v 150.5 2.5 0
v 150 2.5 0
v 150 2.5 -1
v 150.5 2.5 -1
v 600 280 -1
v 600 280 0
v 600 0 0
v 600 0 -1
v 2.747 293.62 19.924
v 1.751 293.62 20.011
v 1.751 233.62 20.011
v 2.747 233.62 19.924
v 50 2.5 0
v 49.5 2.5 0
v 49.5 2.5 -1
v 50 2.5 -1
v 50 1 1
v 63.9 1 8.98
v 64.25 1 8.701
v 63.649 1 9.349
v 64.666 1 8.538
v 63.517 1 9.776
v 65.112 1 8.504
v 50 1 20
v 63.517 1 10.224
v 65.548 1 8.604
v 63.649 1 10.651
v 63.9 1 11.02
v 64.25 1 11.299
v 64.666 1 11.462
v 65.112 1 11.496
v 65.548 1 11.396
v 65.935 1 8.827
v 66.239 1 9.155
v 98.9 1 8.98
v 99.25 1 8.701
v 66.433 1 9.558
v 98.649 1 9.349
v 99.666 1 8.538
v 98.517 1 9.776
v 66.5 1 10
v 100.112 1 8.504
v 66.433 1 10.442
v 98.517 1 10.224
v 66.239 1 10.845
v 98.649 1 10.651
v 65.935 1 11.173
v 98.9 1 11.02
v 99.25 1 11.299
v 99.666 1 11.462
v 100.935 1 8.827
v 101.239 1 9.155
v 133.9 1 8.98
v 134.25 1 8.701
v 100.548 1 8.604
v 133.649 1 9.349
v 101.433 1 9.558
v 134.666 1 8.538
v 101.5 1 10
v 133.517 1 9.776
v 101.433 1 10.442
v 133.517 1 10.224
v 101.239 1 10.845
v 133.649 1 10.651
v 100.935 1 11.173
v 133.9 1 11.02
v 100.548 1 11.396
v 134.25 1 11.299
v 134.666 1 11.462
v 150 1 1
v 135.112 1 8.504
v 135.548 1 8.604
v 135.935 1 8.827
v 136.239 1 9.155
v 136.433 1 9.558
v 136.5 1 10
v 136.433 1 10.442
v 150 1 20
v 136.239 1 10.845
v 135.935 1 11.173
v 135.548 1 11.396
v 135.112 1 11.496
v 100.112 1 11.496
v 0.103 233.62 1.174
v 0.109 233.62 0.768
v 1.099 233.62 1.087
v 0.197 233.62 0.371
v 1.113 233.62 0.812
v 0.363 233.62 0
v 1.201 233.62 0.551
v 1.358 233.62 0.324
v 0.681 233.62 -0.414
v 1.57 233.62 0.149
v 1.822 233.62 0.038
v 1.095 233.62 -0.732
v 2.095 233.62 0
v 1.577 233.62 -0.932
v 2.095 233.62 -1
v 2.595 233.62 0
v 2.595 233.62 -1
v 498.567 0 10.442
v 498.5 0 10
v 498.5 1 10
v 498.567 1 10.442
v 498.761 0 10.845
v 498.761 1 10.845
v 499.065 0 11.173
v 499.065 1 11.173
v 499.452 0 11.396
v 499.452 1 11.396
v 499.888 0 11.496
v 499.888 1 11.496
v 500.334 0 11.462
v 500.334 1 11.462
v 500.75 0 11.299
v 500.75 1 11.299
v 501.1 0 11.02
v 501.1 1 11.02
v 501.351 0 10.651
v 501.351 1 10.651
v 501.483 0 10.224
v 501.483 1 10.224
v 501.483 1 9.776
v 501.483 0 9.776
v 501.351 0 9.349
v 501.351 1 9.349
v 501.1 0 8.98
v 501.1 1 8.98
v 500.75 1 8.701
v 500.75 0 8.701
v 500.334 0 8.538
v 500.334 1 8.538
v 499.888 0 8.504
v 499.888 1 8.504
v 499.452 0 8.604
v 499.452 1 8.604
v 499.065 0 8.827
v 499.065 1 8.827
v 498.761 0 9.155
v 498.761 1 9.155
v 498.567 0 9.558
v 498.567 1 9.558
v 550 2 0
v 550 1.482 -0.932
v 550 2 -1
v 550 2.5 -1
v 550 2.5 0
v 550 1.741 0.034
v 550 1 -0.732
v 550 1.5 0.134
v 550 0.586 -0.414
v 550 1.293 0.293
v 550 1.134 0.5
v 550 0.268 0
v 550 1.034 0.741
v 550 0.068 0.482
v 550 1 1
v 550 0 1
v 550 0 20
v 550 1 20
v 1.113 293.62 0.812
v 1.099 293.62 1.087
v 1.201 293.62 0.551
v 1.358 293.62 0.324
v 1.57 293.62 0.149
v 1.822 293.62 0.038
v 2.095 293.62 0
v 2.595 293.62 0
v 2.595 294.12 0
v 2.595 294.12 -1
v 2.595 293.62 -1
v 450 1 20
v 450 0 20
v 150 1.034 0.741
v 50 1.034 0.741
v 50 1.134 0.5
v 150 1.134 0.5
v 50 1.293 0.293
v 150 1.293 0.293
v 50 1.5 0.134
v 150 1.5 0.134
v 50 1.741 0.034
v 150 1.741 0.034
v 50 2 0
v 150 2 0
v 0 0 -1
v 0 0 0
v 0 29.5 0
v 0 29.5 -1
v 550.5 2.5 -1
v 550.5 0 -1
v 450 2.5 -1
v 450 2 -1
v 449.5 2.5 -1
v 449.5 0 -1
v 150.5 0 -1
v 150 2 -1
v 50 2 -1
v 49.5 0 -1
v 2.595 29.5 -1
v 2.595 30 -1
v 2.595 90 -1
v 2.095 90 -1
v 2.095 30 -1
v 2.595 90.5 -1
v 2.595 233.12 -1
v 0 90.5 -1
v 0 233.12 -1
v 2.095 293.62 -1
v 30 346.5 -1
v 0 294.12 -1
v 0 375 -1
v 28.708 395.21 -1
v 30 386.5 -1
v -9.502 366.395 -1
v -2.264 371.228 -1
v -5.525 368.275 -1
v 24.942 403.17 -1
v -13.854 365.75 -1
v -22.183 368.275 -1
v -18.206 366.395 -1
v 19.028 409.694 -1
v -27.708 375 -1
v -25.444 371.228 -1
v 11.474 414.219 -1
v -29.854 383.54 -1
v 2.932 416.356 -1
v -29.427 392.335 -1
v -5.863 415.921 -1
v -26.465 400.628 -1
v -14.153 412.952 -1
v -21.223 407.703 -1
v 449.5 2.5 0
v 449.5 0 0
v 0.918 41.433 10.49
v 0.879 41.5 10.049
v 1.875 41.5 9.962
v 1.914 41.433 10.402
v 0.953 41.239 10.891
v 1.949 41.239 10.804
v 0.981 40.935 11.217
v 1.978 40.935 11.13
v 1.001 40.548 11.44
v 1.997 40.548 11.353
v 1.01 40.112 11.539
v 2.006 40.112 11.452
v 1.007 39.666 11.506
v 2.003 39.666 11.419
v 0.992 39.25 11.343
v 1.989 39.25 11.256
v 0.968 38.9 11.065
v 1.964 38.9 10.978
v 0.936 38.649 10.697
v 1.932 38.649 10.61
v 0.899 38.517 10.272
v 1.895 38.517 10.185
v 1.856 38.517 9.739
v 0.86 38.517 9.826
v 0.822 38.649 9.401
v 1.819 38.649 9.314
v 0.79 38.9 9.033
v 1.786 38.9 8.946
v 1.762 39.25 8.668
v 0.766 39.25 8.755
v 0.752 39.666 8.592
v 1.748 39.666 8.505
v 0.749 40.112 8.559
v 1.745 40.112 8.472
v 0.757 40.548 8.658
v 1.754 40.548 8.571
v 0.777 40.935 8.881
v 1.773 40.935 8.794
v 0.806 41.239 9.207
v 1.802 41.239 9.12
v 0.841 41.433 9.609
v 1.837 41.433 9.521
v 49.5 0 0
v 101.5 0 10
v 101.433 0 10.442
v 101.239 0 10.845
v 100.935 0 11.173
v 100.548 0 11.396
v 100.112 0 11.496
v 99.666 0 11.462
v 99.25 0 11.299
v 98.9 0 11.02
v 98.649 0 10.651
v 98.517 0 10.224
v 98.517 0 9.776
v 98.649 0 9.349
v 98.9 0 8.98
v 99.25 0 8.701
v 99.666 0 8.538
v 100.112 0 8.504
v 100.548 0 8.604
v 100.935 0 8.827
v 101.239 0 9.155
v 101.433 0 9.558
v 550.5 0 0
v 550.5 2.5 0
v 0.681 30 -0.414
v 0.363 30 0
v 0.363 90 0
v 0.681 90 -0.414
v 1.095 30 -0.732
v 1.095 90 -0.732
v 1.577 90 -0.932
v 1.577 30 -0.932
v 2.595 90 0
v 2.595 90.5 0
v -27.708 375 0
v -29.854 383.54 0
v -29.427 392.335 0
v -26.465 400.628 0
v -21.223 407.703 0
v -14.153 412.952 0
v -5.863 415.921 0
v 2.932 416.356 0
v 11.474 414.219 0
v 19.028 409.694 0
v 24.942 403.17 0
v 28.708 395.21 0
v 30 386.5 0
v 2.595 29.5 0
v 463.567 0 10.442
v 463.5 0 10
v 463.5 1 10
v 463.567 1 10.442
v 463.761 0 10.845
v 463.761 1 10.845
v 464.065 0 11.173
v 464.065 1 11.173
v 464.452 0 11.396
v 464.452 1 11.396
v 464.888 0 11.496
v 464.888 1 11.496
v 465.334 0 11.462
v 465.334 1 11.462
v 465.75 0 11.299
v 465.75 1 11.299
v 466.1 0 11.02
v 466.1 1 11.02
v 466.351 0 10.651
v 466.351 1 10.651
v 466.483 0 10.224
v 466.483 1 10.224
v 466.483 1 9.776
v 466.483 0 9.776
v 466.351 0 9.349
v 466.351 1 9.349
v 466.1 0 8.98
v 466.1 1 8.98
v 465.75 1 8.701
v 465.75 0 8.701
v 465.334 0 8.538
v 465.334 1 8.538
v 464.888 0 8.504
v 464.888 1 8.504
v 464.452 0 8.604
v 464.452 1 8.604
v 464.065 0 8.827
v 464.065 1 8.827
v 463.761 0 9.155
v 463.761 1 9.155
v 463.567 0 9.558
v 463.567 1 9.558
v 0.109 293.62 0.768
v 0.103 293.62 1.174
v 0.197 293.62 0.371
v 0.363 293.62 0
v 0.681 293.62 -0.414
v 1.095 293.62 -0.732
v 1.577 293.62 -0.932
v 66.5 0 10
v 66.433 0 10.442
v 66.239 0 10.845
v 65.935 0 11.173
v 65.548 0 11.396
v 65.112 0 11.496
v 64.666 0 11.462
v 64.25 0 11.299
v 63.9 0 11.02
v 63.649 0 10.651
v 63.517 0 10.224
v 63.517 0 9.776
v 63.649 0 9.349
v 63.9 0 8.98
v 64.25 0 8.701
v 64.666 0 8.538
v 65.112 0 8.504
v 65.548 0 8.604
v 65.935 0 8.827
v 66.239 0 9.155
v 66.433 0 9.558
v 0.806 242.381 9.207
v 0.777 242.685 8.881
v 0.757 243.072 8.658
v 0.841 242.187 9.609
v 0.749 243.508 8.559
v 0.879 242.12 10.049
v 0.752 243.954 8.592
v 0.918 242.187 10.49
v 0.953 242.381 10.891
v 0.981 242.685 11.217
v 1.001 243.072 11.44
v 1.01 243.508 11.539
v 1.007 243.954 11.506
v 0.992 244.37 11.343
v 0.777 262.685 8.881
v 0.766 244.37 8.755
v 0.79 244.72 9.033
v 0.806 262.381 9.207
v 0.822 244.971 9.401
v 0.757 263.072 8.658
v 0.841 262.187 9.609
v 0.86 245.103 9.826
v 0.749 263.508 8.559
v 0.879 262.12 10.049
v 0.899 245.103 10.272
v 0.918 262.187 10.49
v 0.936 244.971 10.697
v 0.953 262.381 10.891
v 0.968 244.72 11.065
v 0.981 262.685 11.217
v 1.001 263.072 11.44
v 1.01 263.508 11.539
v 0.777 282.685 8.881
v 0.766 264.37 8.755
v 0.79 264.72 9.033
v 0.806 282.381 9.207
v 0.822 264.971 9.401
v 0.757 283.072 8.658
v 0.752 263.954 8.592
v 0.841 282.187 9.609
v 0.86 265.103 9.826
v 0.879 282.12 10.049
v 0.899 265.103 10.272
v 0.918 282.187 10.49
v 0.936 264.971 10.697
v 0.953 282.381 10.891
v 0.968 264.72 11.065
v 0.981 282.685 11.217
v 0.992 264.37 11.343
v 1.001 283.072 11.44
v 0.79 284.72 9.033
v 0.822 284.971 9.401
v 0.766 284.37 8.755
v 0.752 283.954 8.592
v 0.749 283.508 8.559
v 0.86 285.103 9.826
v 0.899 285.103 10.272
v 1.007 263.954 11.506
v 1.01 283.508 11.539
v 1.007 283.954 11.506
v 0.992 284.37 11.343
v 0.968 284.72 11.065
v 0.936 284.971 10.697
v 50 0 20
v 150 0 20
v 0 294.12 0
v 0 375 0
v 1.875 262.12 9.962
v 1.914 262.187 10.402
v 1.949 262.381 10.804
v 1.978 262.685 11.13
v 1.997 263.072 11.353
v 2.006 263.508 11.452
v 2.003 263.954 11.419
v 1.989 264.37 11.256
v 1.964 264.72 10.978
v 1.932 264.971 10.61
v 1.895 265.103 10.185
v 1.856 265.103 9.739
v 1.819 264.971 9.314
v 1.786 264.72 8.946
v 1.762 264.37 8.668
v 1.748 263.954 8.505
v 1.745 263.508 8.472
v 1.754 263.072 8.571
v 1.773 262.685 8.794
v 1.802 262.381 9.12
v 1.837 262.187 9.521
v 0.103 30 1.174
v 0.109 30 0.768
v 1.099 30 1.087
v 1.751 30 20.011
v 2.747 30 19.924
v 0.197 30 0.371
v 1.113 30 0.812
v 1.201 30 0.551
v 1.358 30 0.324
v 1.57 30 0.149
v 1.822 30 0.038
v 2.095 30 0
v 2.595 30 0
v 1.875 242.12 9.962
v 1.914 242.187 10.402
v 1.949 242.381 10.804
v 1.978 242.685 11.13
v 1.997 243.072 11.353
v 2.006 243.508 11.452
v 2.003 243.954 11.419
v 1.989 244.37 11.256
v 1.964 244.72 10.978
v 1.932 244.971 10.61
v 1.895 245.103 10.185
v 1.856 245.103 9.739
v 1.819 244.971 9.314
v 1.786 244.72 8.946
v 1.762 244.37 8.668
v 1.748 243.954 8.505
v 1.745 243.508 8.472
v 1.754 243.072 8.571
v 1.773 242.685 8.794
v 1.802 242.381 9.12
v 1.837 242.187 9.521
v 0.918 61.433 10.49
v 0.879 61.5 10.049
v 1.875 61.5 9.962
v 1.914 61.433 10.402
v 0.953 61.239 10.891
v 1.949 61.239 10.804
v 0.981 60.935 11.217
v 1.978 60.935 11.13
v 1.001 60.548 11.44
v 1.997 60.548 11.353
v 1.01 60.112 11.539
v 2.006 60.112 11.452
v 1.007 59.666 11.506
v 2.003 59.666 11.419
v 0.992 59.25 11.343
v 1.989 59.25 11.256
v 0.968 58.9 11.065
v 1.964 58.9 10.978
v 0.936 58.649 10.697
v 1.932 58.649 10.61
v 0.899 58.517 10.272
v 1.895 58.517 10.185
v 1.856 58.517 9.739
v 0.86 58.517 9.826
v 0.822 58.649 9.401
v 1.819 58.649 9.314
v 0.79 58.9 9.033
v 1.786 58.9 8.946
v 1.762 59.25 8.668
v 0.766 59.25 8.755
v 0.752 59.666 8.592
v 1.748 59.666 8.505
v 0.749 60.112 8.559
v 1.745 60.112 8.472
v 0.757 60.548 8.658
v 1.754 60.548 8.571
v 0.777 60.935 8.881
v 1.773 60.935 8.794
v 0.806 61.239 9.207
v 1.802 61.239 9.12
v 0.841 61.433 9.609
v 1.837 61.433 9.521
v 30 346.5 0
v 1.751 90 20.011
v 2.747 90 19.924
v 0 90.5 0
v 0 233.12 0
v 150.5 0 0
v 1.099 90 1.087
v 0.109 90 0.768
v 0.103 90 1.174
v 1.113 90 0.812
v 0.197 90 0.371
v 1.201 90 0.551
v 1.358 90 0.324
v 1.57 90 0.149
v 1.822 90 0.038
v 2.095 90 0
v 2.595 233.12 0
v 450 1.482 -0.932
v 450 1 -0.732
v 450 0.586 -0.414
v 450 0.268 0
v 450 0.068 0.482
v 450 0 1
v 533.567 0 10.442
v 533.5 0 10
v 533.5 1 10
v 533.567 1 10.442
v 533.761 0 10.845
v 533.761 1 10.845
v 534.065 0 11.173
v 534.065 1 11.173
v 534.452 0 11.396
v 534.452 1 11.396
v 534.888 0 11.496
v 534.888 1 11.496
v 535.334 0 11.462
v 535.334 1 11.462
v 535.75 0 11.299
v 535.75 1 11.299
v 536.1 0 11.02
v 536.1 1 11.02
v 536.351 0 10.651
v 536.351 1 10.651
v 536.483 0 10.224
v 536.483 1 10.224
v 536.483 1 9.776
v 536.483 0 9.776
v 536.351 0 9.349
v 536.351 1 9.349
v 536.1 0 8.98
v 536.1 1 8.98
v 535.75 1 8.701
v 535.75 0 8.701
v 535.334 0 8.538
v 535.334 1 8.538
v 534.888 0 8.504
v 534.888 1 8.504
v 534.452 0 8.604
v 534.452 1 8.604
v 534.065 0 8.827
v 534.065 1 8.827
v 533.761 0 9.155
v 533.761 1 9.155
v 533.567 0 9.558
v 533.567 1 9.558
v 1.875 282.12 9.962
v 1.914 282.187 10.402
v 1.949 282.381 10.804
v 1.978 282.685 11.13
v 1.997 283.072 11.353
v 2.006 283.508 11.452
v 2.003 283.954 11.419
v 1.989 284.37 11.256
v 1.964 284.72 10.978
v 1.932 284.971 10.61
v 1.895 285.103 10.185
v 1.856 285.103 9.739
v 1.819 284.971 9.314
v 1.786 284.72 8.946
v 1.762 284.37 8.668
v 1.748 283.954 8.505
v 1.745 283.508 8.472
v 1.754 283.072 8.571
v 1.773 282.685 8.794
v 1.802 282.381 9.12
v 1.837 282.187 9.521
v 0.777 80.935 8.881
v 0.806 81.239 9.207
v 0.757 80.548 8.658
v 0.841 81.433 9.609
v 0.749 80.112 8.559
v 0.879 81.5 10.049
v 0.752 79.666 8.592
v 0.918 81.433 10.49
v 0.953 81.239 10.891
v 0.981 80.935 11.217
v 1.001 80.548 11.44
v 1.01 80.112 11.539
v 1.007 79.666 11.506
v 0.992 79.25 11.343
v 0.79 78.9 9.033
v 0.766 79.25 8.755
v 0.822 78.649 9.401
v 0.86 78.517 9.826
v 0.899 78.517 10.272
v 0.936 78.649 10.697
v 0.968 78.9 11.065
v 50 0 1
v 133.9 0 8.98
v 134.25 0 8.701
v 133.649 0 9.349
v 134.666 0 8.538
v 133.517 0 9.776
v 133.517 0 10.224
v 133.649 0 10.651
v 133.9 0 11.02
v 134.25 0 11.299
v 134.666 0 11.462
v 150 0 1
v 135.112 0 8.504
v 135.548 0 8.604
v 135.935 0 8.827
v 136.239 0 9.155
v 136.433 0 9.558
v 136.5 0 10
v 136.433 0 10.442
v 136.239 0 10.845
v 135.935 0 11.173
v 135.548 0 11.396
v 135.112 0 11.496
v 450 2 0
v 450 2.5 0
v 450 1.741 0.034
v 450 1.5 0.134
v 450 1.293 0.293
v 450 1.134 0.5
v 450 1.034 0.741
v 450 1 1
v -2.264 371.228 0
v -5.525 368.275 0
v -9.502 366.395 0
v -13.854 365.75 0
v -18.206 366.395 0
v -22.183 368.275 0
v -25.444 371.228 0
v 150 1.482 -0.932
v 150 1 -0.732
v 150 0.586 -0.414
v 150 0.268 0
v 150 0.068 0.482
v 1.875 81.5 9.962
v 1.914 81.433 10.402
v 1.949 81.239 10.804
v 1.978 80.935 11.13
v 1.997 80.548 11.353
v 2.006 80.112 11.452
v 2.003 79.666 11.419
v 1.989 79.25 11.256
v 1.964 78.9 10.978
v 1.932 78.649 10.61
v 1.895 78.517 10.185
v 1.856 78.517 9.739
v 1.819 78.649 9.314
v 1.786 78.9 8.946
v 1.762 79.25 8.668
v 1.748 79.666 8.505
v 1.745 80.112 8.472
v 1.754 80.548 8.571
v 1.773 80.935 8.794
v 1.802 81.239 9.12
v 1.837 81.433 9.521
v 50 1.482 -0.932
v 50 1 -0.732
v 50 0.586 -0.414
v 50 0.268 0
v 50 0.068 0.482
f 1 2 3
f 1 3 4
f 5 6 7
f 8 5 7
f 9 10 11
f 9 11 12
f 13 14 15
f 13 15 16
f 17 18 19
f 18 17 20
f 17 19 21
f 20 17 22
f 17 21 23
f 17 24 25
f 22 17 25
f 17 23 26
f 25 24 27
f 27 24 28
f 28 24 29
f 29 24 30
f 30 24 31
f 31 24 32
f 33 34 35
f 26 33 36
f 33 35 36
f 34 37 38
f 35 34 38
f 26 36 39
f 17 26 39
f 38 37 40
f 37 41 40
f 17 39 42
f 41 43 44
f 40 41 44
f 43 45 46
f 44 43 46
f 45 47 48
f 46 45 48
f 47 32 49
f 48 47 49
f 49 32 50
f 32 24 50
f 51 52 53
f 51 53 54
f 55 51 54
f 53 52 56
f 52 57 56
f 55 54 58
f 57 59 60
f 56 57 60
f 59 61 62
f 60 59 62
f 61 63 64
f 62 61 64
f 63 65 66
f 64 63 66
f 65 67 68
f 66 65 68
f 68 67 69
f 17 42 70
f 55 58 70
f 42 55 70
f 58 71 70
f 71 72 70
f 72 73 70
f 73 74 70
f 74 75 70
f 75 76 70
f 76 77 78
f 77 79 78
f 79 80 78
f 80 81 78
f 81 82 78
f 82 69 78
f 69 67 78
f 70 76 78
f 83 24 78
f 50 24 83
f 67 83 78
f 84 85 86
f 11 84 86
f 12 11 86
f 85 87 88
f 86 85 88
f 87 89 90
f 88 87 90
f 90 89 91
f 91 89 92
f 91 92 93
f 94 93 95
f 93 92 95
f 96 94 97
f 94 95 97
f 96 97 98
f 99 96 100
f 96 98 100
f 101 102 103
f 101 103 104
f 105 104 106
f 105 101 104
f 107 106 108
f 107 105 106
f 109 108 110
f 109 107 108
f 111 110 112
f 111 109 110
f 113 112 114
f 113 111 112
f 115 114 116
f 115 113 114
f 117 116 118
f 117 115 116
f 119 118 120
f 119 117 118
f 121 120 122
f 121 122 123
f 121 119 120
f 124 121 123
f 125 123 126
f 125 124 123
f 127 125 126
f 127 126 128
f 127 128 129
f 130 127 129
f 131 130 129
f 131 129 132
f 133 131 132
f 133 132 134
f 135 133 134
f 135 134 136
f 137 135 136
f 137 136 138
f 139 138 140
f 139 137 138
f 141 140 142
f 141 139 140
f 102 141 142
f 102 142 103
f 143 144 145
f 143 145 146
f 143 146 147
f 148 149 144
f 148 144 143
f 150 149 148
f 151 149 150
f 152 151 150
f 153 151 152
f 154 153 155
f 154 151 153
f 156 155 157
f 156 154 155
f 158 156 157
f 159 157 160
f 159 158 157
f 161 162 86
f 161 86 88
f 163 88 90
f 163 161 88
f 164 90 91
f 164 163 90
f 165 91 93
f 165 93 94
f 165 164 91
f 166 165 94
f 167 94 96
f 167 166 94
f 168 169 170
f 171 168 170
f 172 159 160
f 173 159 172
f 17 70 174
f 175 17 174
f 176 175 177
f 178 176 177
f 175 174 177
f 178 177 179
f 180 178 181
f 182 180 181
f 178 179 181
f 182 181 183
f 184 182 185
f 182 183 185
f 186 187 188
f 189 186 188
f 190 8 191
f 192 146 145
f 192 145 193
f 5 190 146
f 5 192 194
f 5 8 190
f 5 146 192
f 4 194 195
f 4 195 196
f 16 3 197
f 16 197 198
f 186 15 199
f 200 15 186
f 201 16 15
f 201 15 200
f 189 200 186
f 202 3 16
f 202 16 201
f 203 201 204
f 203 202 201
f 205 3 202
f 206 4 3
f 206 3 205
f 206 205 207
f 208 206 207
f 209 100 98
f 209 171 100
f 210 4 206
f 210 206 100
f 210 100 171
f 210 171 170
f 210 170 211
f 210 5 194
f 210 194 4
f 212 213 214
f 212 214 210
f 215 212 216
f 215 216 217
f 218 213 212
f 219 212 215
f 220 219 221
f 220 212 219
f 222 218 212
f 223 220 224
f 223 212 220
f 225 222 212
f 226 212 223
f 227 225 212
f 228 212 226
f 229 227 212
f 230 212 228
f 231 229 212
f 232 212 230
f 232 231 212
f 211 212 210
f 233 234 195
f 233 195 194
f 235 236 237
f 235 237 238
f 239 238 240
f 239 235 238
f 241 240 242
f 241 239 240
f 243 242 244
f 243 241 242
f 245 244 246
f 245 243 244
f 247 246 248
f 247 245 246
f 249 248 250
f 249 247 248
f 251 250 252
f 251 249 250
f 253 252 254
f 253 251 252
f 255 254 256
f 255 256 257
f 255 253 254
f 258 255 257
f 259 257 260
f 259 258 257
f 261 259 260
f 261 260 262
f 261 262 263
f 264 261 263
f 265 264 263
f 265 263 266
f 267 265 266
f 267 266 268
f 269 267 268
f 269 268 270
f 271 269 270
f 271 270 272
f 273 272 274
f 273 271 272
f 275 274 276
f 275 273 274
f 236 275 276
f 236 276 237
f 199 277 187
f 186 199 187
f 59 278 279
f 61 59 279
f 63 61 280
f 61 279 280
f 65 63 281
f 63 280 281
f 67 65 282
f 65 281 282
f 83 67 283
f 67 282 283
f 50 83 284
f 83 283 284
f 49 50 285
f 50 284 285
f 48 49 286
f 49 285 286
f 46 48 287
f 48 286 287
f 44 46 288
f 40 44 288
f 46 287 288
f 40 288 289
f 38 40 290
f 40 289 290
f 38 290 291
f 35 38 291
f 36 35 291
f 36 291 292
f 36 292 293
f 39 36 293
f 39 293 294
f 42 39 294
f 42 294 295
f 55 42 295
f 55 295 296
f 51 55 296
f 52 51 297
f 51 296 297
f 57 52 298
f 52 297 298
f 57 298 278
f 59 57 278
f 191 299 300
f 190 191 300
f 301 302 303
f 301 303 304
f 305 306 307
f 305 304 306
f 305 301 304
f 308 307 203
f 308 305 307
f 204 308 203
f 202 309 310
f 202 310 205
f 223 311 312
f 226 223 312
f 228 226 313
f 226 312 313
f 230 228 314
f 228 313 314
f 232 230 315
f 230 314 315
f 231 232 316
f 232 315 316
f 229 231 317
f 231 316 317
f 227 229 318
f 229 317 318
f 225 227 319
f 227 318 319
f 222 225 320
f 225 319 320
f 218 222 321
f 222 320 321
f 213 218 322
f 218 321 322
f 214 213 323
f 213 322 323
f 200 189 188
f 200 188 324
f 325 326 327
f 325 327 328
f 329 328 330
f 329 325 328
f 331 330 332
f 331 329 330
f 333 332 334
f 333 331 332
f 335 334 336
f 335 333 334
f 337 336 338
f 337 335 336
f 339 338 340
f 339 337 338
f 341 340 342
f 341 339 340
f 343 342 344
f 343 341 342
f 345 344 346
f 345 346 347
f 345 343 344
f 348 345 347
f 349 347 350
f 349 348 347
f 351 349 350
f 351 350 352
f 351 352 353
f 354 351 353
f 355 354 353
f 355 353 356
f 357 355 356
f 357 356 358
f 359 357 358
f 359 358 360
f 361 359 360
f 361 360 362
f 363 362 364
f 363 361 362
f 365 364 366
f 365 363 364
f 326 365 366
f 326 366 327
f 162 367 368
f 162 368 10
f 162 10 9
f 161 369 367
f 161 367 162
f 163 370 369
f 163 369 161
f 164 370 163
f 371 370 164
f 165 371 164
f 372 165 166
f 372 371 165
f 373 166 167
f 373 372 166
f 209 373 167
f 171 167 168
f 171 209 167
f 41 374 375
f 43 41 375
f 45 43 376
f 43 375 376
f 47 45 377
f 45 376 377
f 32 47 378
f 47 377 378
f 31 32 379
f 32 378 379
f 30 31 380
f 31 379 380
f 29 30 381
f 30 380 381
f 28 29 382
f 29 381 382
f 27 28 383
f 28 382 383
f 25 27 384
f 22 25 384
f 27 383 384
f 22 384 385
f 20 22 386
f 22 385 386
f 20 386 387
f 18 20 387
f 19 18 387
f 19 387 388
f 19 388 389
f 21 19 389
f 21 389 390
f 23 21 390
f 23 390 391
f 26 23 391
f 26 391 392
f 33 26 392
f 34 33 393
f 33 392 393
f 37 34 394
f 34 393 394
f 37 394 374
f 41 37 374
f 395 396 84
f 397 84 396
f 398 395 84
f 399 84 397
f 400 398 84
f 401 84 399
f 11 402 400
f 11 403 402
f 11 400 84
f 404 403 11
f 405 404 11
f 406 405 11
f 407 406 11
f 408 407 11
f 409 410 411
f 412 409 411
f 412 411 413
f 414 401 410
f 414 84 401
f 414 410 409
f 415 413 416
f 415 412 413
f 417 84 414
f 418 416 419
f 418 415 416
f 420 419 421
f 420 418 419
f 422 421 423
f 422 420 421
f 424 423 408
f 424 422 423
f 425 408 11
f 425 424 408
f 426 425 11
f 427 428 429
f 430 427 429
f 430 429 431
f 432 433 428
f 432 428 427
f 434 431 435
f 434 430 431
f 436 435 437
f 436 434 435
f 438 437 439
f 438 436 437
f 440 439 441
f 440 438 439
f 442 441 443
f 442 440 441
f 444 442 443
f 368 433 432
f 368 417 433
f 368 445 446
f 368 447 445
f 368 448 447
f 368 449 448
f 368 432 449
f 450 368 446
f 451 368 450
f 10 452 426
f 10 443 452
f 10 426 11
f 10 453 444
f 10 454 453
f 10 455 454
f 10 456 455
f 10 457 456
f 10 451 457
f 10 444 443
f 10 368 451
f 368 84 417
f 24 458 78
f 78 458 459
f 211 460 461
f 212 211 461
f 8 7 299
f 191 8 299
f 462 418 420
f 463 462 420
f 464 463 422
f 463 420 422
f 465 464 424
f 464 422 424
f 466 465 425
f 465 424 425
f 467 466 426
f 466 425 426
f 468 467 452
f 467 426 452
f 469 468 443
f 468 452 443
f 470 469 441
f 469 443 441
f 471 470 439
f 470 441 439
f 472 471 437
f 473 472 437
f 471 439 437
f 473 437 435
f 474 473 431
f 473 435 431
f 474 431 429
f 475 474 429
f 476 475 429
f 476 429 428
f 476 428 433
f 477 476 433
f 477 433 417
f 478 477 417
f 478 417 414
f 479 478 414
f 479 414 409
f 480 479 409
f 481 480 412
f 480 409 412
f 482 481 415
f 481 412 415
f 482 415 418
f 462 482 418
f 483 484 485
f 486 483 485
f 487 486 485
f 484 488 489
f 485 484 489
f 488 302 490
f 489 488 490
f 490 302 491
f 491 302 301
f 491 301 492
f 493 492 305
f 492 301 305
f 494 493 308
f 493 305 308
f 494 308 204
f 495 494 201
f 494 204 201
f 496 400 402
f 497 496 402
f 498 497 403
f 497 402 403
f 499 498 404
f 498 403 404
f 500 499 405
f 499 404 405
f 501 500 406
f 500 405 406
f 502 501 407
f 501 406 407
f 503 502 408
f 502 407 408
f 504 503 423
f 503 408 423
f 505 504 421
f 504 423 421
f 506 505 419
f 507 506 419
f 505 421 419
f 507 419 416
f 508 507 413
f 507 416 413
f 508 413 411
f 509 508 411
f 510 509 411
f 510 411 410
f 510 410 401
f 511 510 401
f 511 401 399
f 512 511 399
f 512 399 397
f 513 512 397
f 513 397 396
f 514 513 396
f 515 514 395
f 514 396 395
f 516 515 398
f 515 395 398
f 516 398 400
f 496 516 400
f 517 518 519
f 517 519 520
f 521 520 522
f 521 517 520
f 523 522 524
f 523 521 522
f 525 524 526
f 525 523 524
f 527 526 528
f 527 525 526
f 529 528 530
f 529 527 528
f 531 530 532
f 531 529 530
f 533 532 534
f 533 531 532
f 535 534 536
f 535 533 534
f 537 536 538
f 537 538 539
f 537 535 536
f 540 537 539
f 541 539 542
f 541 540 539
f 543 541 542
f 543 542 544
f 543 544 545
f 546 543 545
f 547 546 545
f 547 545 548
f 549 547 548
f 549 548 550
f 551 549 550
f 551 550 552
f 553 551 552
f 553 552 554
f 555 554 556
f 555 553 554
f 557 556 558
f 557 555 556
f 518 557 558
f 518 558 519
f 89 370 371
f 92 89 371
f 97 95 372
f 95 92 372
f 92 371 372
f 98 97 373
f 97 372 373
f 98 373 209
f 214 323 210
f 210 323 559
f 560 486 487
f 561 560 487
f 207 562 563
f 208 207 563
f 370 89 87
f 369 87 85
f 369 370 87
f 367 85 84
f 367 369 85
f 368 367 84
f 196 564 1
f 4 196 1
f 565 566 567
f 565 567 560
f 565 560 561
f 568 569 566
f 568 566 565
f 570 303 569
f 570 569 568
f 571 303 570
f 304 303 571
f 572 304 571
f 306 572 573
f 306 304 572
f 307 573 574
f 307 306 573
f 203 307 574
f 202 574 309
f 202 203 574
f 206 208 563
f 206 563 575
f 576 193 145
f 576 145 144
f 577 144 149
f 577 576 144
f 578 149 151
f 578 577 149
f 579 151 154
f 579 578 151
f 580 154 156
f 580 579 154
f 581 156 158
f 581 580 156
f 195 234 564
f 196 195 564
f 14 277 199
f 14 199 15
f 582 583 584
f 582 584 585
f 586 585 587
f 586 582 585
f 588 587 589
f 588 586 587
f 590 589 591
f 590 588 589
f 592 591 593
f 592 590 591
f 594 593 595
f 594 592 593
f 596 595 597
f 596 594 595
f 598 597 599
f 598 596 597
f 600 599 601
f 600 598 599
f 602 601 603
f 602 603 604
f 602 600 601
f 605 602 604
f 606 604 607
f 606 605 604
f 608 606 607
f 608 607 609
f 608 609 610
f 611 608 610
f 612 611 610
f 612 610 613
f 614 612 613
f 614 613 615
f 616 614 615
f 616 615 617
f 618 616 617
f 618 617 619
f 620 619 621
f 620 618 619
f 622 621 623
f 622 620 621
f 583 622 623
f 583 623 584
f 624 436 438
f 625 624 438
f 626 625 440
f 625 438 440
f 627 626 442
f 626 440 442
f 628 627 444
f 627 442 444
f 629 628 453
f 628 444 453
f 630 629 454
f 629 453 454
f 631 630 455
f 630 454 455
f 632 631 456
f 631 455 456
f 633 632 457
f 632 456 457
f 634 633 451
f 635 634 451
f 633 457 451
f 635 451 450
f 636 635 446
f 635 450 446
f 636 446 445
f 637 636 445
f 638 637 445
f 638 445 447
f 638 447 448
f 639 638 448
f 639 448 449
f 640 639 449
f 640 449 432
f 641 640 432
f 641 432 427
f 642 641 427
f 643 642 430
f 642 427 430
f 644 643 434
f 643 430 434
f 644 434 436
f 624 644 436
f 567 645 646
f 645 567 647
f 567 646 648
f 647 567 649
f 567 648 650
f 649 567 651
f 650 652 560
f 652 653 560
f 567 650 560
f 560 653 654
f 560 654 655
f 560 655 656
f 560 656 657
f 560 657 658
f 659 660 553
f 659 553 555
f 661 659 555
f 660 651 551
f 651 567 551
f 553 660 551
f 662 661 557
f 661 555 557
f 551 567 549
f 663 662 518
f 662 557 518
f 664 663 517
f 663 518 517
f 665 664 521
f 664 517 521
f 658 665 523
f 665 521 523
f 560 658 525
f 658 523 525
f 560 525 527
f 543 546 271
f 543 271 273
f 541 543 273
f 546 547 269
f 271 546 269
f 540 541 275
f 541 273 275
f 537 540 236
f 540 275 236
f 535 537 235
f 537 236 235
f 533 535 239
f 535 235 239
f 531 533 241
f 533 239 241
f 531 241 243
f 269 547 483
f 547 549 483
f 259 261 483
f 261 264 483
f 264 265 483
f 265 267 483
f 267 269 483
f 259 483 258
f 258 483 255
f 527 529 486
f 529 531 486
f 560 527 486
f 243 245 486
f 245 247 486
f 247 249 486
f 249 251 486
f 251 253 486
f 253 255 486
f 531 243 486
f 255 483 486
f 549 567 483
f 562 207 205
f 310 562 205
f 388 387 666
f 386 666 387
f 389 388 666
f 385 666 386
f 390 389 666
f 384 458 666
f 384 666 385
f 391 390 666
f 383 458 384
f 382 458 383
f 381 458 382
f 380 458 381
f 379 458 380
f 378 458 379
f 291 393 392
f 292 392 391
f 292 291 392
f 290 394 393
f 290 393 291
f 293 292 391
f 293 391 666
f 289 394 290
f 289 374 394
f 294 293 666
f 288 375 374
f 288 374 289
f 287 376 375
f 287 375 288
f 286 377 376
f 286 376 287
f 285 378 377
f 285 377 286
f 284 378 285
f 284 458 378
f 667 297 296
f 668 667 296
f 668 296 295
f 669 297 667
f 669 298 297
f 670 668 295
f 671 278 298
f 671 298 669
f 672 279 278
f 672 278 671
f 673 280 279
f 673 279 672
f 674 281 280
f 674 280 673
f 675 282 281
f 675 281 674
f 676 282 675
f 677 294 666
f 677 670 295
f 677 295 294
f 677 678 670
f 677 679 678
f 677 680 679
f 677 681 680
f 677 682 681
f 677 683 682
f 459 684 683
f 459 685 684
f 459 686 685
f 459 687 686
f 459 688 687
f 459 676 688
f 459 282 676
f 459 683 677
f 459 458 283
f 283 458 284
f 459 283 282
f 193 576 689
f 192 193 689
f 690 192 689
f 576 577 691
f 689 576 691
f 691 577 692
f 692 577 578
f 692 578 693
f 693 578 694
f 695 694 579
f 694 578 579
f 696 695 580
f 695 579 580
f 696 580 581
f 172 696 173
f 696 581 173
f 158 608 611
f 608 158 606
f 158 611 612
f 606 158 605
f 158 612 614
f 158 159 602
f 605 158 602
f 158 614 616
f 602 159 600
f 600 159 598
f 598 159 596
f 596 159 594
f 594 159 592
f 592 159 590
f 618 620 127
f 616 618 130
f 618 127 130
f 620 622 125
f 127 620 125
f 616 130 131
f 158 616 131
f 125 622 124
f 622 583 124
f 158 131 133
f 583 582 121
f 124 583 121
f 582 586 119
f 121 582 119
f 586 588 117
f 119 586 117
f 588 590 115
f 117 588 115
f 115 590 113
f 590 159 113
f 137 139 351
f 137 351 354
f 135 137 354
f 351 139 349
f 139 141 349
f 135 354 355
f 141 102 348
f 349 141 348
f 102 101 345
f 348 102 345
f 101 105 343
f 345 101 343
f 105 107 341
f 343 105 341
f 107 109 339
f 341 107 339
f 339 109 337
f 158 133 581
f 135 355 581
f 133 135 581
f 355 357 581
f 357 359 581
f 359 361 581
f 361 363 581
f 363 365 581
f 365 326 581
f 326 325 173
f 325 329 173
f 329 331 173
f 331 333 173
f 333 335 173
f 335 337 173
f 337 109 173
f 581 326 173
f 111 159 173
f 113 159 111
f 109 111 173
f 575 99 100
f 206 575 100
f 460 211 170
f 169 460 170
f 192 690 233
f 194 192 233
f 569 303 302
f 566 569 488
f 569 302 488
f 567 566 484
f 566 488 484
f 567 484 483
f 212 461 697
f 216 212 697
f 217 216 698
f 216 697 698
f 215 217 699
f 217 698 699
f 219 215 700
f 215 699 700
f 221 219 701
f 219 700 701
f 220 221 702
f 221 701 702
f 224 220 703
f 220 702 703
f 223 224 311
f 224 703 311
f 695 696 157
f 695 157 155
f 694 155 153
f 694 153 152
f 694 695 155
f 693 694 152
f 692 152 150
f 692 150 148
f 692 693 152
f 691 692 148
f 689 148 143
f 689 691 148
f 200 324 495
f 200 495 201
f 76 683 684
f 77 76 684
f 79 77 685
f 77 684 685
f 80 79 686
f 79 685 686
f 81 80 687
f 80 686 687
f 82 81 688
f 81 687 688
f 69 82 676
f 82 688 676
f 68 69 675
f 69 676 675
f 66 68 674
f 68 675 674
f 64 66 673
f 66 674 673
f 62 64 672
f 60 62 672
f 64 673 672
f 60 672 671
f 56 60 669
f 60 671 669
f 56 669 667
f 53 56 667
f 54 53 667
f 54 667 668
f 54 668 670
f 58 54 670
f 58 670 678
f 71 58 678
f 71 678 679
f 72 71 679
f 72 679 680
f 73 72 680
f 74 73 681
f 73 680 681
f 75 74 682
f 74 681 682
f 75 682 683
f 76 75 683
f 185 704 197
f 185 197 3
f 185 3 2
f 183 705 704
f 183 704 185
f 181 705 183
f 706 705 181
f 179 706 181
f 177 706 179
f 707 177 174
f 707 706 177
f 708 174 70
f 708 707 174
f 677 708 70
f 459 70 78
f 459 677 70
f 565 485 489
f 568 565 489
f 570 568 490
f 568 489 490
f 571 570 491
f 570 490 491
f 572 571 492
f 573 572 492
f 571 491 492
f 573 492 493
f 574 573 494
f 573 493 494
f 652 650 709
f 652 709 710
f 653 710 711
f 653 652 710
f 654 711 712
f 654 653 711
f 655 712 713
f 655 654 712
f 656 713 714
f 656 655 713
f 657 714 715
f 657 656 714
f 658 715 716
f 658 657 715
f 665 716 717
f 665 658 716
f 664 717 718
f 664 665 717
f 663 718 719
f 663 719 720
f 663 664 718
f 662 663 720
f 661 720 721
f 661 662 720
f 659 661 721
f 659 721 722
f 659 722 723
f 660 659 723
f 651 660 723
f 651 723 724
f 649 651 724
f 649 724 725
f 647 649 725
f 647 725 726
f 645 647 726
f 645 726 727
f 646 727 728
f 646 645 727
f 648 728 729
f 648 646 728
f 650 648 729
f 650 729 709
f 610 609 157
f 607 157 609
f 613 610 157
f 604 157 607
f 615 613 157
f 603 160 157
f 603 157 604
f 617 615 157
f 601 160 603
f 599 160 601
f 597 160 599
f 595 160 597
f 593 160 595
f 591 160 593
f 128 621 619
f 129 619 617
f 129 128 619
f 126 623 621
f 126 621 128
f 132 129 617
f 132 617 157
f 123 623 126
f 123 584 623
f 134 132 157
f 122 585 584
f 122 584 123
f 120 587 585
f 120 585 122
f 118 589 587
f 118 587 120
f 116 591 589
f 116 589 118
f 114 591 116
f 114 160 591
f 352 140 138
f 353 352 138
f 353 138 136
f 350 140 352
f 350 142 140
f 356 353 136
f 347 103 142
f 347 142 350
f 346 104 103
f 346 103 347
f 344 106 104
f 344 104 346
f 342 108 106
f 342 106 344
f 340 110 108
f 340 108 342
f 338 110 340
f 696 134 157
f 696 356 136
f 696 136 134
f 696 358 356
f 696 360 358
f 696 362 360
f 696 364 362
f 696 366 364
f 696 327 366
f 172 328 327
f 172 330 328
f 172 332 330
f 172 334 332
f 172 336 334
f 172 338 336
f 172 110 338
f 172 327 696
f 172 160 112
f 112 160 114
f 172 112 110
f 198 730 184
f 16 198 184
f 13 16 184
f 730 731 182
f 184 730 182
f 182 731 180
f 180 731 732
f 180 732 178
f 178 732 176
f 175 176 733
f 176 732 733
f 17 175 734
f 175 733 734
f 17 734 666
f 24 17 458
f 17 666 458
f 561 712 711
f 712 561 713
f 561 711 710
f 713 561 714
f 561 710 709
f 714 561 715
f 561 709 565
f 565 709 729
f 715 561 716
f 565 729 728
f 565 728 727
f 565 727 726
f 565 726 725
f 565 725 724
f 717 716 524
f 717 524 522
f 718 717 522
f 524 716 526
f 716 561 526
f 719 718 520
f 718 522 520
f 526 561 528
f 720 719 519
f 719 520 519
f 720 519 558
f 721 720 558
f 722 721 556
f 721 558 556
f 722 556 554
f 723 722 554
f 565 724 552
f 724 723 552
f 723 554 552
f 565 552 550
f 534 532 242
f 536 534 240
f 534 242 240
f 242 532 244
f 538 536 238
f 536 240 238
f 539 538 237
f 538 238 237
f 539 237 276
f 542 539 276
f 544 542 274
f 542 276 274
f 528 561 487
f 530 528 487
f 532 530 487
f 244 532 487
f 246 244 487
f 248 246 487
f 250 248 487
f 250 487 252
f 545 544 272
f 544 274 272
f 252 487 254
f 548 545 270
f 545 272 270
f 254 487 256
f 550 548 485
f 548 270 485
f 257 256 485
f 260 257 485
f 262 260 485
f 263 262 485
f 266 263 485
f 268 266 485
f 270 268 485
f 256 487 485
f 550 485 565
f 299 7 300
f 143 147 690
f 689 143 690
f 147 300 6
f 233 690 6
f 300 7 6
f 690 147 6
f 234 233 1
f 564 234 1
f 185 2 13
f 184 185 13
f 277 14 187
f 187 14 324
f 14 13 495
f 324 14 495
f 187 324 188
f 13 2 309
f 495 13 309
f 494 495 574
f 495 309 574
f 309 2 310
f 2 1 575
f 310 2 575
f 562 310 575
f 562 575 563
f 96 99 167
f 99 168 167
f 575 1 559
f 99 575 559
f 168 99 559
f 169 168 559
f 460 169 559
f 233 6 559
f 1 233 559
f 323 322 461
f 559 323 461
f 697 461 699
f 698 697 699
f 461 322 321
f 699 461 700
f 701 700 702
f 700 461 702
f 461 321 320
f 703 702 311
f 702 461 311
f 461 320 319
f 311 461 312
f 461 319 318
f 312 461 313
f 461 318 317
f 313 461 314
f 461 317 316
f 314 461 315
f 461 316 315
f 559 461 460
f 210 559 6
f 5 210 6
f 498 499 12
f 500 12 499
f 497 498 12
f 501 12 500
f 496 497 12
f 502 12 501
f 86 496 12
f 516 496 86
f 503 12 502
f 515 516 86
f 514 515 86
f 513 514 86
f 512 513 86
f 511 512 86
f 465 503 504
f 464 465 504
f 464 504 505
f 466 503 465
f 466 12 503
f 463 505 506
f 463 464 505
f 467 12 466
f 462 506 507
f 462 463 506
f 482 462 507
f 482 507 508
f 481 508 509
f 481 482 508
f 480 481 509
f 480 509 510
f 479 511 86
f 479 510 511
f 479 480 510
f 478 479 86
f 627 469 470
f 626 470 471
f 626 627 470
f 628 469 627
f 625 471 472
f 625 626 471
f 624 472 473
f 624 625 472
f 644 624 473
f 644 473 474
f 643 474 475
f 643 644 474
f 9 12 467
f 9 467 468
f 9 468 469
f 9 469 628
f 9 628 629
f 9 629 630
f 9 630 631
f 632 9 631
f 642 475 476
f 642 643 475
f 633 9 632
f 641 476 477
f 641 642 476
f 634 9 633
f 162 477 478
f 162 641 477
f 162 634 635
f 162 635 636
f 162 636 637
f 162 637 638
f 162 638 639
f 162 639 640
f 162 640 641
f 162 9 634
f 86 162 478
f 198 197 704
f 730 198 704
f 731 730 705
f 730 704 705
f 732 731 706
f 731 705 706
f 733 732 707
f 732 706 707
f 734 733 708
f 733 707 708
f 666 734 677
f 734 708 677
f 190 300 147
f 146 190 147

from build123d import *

# Parameters (mm, degrees)
BASE_FLANGE1_DEPTH            = 1
EDGE_FLANGE1_STRIP_W          = 6
EDGE_FLANGE1_STRIP_H          = 1
EDGE_FLANGE1_STRIP_CUT_DEPTH  = 100
EDGE_FLANGE1_RELIEF_W         = 6.5
EDGE_FLANGE1_RELIEF_H         = 0.5
EDGE_FLANGE1_RELIEF_CUT_DEPTH = 1
EDGE_FLANGE1_DEPTH            = 100
EDGE_FLANGE1_PROFILE_W        = 100
EDGE_FLANGE1_PROFILE_H        = 19
EDGE_FLANGE1_PROFILE_R        = 1.5
EDGE_FLANGE1_FLAT_DEPTH       = 1
EDGE_FLANGE2_START            = 29.5
EDGE_FLANGE2_DEPTH            = 61
EDGE_FLANGE2_2_DEPTH          = 0.5
EDGE_FLANGE2_START_2          = 90
EDGE_FLANGE2_3_DEPTH          = 0.5
EDGE_FLANGE2_START_3          = 30
EDGE_FLANGE2_4_DEPTH          = 60
EDGE_FLANGE2_5_OUTLINE_R      = 1.5
EDGE_FLANGE2_5_DEPTH          = 1


with BuildPart() as part:
    # Base-Flange1: sheet metal written as solids
    # Sketch1 → Base-Flange1 (new body)
    with BuildSketch(Plane.XY):
        with BuildLine():
            Line((0, 0), (0, 350))
            Line((0, 350), (0, 375))
            ThreePointArc((0, 375), (-13.854151002, 365.75), (-27.708302005, 375))
            ThreePointArc((-27.708302005, 375), (-5.863059775, 415.921497754), (30, 386.5))
            Line((30, 386.5), (30, 346.5))
            Line((30, 346.5), (600, 280))
            Line((600, 280), (600, 0))
            Line((600, 0), (0, 0))
        make_face()
    extrude(amount=-BASE_FLANGE1_DEPTH)

    # Edge-Flange1: sheet metal written as solids
    # Edge-Flange1 strip (on a plane across the edge) → Edge-Flange1 strip cut (cut)
    with BuildSketch(Plane.YZ.offset(450)):
        with Locations((-1, -0.5)):
            Rectangle(EDGE_FLANGE1_STRIP_W, EDGE_FLANGE1_STRIP_H)
    edge_flange1_strip_cut = extrude(amount=EDGE_FLANGE1_STRIP_CUT_DEPTH, mode=Mode.SUBTRACT)

    # Edge-Flange1 relief (on the sheet) → Edge-Flange1 relief cut (cut)
    with BuildSketch(Plane(origin=(450, 2, 0), x_dir=(0, 1, 0), z_dir=(0, 0, 1))):
        with Locations((-2.75, 0.25)):
            Rectangle(EDGE_FLANGE1_RELIEF_W, EDGE_FLANGE1_RELIEF_H)
        with Locations((-2.75, -100.25)):
            Rectangle(EDGE_FLANGE1_RELIEF_W, EDGE_FLANGE1_RELIEF_H)
    edge_flange1_relief_cut = extrude(amount=-EDGE_FLANGE1_RELIEF_CUT_DEPTH, mode=Mode.SUBTRACT)

    # Edge-Flange1 bend section (on a plane across the edge) → Edge-Flange1 (add)
    with BuildSketch(Plane.YZ.offset(450)):
        with BuildLine():
            Line((0, 1), (1, 1))
            ThreePointArc((1, 1), (1.292893219, 0.292893219), (2, 0))
            Line((2, 0), (2, -1))
            ThreePointArc((2, -1), (0.585786438, -0.414213562), (0, 1))
        make_face()
    edge_flange1 = extrude(amount=EDGE_FLANGE1_DEPTH)

    # Edge-Flange1 profile (on flange) → Edge-Flange1 flat (add)
    with BuildSketch(Plane(origin=(0, 0, 0), x_dir=(-1, 0, 0), z_dir=(0, 1, 0))):
        with Locations((-500, 10.5)):
            Rectangle(EDGE_FLANGE1_PROFILE_W, EDGE_FLANGE1_PROFILE_H)
        with Locations((-535, 10)):
            Circle(EDGE_FLANGE1_PROFILE_R, mode=Mode.SUBTRACT)
        with Locations((-465, 10)):
            Circle(EDGE_FLANGE1_PROFILE_R, mode=Mode.SUBTRACT)
        with Locations((-500, 10)):
            Circle(EDGE_FLANGE1_PROFILE_R, mode=Mode.SUBTRACT)
    edge_flange1_flat = extrude(amount=EDGE_FLANGE1_FLAT_DEPTH)

    # Mirror1: Edge-Flange1 strip cut, Edge-Flange1 relief cut, Edge-Flange1, Edge-Flange1 flat across plane
    add(edge_flange1_strip_cut.mirror(Plane(origin=(300, 0, 0), x_dir=(0, 0, 1), z_dir=(1, 0, 0))), mode=Mode.SUBTRACT)
    add(edge_flange1_relief_cut.mirror(Plane(origin=(300, 0, 0), x_dir=(0, 0, 1), z_dir=(1, 0, 0))), mode=Mode.SUBTRACT)
    add(edge_flange1.mirror(Plane(origin=(300, 0, 0), x_dir=(0, 0, 1), z_dir=(1, 0, 0))))
    add(edge_flange1_flat.mirror(Plane(origin=(300, 0, 0), x_dir=(0, 0, 1), z_dir=(1, 0, 0))))

    # Edge-Flange2: read off the stored shape, not the designer's step
    # Edge-Flange2 outline → Edge-Flange2 (cut)
    with BuildSketch(Plane(origin=(0, 0, 0), x_dir=(1, 0, 0), z_dir=(0, 1, 0)).offset(EDGE_FLANGE2_START)):
        with BuildLine():
            ThreePointArc((0.363077531, 0), (1.095128339, 0.732050808), (2.095128339, 1))
            Line((2.095128339, 1), (0, 1))
            Line((0, 1), (0, 0))
            Line((0, 0), (0.363077531, 0))
        make_face()
    edge_flange2 = extrude(amount=EDGE_FLANGE2_DEPTH, mode=Mode.SUBTRACT)

    # Edge-Flange2 2 outline → Edge-Flange2 2 (cut)
    with BuildSketch(Plane(origin=(0, 0, 0), x_dir=(1, 0, 0), z_dir=(0, 1, 0)).offset(EDGE_FLANGE2_START)):
        with BuildLine():
            Line((2.595128339, 0), (2.595128339, 1))
            Line((2.595128339, 1), (2.095128339, 1))
            ThreePointArc((2.095128339, 1), (1.095128339, 0.732050808), (0.363077531, 0))
            Line((0.363077531, 0), (2.595128339, 0))
        make_face()
    edge_flange2_2 = extrude(amount=EDGE_FLANGE2_2_DEPTH, mode=Mode.SUBTRACT)

    # Edge-Flange2 3 outline → Edge-Flange2 3 (cut)
    with BuildSketch(Plane(origin=(0, 0, 0), x_dir=(1, 0, 0), z_dir=(0, 1, 0)).offset(EDGE_FLANGE2_START_2)):
        with BuildLine():
            Line((2.595128339, 0), (2.595128339, 1))
            Line((2.595128339, 1), (2.095128339, 1))
            ThreePointArc((2.095128339, 1), (1.095128339, 0.732050808), (0.363077531, 0))
            Line((0.363077531, 0), (2.595128339, 0))
        make_face()
    edge_flange2_3 = extrude(amount=EDGE_FLANGE2_3_DEPTH, mode=Mode.SUBTRACT)

    # Edge-Flange2 4 outline → Edge-Flange2 4 (add)
    with BuildSketch(Plane(origin=(0, 0, 0), x_dir=(1, 0, 0), z_dir=(0, 1, 0)).offset(EDGE_FLANGE2_START_3)):
        with BuildLine():
            ThreePointArc((1.098933641, -1.087155743), (1.357851002, -0.324409792), (2.095128339, 0))
            Line((2.095128339, 0), (0.363077531, 0))
            ThreePointArc((0.363077531, 0), (0.142536324, -0.567120772), (0.102738942, -1.174311485))
            Line((0.102738942, -1.174311485), (1.750739994, -20.011049705))
            Line((1.750739994, -20.011049705), (2.746934692, -19.923893962))
            Line((2.746934692, -19.923893962), (1.098933641, -1.087155743))
        make_face()
    edge_flange2_4 = extrude(amount=EDGE_FLANGE2_4_DEPTH)

    # Edge-Flange2 5 outline → Edge-Flange2 5 (cut)
    with BuildSketch(Plane(origin=(0, 0, 0), x_dir=(0, 1, 0), z_dir=(0.9961946980917459, 0, -0.0871557427476548))):
        with Locations((80, 10.087488664)):
            Circle(EDGE_FLANGE2_5_OUTLINE_R)
        with Locations((60, 10.087488664)):
            Circle(EDGE_FLANGE2_5_OUTLINE_R)
        with Locations((40, 10.087488664)):
            Circle(EDGE_FLANGE2_5_OUTLINE_R)
    edge_flange2_5 = extrude(amount=EDGE_FLANGE2_5_DEPTH, mode=Mode.SUBTRACT)

    # Mirror2: Edge-Flange2, Edge-Flange2 2, Edge-Flange2 3, Edge-Flange2 4, Edge-Flange2 5 across plane
    add(edge_flange2.mirror(Plane.ZX.offset(161.81)), mode=Mode.SUBTRACT)
    add(edge_flange2_2.mirror(Plane.ZX.offset(161.81)), mode=Mode.SUBTRACT)
    add(edge_flange2_3.mirror(Plane.ZX.offset(161.81)), mode=Mode.SUBTRACT)
    add(edge_flange2_4.mirror(Plane.ZX.offset(161.81)))
    add(edge_flange2_5.mirror(Plane.ZX.offset(161.81)), mode=Mode.SUBTRACT)


solid = part.part
